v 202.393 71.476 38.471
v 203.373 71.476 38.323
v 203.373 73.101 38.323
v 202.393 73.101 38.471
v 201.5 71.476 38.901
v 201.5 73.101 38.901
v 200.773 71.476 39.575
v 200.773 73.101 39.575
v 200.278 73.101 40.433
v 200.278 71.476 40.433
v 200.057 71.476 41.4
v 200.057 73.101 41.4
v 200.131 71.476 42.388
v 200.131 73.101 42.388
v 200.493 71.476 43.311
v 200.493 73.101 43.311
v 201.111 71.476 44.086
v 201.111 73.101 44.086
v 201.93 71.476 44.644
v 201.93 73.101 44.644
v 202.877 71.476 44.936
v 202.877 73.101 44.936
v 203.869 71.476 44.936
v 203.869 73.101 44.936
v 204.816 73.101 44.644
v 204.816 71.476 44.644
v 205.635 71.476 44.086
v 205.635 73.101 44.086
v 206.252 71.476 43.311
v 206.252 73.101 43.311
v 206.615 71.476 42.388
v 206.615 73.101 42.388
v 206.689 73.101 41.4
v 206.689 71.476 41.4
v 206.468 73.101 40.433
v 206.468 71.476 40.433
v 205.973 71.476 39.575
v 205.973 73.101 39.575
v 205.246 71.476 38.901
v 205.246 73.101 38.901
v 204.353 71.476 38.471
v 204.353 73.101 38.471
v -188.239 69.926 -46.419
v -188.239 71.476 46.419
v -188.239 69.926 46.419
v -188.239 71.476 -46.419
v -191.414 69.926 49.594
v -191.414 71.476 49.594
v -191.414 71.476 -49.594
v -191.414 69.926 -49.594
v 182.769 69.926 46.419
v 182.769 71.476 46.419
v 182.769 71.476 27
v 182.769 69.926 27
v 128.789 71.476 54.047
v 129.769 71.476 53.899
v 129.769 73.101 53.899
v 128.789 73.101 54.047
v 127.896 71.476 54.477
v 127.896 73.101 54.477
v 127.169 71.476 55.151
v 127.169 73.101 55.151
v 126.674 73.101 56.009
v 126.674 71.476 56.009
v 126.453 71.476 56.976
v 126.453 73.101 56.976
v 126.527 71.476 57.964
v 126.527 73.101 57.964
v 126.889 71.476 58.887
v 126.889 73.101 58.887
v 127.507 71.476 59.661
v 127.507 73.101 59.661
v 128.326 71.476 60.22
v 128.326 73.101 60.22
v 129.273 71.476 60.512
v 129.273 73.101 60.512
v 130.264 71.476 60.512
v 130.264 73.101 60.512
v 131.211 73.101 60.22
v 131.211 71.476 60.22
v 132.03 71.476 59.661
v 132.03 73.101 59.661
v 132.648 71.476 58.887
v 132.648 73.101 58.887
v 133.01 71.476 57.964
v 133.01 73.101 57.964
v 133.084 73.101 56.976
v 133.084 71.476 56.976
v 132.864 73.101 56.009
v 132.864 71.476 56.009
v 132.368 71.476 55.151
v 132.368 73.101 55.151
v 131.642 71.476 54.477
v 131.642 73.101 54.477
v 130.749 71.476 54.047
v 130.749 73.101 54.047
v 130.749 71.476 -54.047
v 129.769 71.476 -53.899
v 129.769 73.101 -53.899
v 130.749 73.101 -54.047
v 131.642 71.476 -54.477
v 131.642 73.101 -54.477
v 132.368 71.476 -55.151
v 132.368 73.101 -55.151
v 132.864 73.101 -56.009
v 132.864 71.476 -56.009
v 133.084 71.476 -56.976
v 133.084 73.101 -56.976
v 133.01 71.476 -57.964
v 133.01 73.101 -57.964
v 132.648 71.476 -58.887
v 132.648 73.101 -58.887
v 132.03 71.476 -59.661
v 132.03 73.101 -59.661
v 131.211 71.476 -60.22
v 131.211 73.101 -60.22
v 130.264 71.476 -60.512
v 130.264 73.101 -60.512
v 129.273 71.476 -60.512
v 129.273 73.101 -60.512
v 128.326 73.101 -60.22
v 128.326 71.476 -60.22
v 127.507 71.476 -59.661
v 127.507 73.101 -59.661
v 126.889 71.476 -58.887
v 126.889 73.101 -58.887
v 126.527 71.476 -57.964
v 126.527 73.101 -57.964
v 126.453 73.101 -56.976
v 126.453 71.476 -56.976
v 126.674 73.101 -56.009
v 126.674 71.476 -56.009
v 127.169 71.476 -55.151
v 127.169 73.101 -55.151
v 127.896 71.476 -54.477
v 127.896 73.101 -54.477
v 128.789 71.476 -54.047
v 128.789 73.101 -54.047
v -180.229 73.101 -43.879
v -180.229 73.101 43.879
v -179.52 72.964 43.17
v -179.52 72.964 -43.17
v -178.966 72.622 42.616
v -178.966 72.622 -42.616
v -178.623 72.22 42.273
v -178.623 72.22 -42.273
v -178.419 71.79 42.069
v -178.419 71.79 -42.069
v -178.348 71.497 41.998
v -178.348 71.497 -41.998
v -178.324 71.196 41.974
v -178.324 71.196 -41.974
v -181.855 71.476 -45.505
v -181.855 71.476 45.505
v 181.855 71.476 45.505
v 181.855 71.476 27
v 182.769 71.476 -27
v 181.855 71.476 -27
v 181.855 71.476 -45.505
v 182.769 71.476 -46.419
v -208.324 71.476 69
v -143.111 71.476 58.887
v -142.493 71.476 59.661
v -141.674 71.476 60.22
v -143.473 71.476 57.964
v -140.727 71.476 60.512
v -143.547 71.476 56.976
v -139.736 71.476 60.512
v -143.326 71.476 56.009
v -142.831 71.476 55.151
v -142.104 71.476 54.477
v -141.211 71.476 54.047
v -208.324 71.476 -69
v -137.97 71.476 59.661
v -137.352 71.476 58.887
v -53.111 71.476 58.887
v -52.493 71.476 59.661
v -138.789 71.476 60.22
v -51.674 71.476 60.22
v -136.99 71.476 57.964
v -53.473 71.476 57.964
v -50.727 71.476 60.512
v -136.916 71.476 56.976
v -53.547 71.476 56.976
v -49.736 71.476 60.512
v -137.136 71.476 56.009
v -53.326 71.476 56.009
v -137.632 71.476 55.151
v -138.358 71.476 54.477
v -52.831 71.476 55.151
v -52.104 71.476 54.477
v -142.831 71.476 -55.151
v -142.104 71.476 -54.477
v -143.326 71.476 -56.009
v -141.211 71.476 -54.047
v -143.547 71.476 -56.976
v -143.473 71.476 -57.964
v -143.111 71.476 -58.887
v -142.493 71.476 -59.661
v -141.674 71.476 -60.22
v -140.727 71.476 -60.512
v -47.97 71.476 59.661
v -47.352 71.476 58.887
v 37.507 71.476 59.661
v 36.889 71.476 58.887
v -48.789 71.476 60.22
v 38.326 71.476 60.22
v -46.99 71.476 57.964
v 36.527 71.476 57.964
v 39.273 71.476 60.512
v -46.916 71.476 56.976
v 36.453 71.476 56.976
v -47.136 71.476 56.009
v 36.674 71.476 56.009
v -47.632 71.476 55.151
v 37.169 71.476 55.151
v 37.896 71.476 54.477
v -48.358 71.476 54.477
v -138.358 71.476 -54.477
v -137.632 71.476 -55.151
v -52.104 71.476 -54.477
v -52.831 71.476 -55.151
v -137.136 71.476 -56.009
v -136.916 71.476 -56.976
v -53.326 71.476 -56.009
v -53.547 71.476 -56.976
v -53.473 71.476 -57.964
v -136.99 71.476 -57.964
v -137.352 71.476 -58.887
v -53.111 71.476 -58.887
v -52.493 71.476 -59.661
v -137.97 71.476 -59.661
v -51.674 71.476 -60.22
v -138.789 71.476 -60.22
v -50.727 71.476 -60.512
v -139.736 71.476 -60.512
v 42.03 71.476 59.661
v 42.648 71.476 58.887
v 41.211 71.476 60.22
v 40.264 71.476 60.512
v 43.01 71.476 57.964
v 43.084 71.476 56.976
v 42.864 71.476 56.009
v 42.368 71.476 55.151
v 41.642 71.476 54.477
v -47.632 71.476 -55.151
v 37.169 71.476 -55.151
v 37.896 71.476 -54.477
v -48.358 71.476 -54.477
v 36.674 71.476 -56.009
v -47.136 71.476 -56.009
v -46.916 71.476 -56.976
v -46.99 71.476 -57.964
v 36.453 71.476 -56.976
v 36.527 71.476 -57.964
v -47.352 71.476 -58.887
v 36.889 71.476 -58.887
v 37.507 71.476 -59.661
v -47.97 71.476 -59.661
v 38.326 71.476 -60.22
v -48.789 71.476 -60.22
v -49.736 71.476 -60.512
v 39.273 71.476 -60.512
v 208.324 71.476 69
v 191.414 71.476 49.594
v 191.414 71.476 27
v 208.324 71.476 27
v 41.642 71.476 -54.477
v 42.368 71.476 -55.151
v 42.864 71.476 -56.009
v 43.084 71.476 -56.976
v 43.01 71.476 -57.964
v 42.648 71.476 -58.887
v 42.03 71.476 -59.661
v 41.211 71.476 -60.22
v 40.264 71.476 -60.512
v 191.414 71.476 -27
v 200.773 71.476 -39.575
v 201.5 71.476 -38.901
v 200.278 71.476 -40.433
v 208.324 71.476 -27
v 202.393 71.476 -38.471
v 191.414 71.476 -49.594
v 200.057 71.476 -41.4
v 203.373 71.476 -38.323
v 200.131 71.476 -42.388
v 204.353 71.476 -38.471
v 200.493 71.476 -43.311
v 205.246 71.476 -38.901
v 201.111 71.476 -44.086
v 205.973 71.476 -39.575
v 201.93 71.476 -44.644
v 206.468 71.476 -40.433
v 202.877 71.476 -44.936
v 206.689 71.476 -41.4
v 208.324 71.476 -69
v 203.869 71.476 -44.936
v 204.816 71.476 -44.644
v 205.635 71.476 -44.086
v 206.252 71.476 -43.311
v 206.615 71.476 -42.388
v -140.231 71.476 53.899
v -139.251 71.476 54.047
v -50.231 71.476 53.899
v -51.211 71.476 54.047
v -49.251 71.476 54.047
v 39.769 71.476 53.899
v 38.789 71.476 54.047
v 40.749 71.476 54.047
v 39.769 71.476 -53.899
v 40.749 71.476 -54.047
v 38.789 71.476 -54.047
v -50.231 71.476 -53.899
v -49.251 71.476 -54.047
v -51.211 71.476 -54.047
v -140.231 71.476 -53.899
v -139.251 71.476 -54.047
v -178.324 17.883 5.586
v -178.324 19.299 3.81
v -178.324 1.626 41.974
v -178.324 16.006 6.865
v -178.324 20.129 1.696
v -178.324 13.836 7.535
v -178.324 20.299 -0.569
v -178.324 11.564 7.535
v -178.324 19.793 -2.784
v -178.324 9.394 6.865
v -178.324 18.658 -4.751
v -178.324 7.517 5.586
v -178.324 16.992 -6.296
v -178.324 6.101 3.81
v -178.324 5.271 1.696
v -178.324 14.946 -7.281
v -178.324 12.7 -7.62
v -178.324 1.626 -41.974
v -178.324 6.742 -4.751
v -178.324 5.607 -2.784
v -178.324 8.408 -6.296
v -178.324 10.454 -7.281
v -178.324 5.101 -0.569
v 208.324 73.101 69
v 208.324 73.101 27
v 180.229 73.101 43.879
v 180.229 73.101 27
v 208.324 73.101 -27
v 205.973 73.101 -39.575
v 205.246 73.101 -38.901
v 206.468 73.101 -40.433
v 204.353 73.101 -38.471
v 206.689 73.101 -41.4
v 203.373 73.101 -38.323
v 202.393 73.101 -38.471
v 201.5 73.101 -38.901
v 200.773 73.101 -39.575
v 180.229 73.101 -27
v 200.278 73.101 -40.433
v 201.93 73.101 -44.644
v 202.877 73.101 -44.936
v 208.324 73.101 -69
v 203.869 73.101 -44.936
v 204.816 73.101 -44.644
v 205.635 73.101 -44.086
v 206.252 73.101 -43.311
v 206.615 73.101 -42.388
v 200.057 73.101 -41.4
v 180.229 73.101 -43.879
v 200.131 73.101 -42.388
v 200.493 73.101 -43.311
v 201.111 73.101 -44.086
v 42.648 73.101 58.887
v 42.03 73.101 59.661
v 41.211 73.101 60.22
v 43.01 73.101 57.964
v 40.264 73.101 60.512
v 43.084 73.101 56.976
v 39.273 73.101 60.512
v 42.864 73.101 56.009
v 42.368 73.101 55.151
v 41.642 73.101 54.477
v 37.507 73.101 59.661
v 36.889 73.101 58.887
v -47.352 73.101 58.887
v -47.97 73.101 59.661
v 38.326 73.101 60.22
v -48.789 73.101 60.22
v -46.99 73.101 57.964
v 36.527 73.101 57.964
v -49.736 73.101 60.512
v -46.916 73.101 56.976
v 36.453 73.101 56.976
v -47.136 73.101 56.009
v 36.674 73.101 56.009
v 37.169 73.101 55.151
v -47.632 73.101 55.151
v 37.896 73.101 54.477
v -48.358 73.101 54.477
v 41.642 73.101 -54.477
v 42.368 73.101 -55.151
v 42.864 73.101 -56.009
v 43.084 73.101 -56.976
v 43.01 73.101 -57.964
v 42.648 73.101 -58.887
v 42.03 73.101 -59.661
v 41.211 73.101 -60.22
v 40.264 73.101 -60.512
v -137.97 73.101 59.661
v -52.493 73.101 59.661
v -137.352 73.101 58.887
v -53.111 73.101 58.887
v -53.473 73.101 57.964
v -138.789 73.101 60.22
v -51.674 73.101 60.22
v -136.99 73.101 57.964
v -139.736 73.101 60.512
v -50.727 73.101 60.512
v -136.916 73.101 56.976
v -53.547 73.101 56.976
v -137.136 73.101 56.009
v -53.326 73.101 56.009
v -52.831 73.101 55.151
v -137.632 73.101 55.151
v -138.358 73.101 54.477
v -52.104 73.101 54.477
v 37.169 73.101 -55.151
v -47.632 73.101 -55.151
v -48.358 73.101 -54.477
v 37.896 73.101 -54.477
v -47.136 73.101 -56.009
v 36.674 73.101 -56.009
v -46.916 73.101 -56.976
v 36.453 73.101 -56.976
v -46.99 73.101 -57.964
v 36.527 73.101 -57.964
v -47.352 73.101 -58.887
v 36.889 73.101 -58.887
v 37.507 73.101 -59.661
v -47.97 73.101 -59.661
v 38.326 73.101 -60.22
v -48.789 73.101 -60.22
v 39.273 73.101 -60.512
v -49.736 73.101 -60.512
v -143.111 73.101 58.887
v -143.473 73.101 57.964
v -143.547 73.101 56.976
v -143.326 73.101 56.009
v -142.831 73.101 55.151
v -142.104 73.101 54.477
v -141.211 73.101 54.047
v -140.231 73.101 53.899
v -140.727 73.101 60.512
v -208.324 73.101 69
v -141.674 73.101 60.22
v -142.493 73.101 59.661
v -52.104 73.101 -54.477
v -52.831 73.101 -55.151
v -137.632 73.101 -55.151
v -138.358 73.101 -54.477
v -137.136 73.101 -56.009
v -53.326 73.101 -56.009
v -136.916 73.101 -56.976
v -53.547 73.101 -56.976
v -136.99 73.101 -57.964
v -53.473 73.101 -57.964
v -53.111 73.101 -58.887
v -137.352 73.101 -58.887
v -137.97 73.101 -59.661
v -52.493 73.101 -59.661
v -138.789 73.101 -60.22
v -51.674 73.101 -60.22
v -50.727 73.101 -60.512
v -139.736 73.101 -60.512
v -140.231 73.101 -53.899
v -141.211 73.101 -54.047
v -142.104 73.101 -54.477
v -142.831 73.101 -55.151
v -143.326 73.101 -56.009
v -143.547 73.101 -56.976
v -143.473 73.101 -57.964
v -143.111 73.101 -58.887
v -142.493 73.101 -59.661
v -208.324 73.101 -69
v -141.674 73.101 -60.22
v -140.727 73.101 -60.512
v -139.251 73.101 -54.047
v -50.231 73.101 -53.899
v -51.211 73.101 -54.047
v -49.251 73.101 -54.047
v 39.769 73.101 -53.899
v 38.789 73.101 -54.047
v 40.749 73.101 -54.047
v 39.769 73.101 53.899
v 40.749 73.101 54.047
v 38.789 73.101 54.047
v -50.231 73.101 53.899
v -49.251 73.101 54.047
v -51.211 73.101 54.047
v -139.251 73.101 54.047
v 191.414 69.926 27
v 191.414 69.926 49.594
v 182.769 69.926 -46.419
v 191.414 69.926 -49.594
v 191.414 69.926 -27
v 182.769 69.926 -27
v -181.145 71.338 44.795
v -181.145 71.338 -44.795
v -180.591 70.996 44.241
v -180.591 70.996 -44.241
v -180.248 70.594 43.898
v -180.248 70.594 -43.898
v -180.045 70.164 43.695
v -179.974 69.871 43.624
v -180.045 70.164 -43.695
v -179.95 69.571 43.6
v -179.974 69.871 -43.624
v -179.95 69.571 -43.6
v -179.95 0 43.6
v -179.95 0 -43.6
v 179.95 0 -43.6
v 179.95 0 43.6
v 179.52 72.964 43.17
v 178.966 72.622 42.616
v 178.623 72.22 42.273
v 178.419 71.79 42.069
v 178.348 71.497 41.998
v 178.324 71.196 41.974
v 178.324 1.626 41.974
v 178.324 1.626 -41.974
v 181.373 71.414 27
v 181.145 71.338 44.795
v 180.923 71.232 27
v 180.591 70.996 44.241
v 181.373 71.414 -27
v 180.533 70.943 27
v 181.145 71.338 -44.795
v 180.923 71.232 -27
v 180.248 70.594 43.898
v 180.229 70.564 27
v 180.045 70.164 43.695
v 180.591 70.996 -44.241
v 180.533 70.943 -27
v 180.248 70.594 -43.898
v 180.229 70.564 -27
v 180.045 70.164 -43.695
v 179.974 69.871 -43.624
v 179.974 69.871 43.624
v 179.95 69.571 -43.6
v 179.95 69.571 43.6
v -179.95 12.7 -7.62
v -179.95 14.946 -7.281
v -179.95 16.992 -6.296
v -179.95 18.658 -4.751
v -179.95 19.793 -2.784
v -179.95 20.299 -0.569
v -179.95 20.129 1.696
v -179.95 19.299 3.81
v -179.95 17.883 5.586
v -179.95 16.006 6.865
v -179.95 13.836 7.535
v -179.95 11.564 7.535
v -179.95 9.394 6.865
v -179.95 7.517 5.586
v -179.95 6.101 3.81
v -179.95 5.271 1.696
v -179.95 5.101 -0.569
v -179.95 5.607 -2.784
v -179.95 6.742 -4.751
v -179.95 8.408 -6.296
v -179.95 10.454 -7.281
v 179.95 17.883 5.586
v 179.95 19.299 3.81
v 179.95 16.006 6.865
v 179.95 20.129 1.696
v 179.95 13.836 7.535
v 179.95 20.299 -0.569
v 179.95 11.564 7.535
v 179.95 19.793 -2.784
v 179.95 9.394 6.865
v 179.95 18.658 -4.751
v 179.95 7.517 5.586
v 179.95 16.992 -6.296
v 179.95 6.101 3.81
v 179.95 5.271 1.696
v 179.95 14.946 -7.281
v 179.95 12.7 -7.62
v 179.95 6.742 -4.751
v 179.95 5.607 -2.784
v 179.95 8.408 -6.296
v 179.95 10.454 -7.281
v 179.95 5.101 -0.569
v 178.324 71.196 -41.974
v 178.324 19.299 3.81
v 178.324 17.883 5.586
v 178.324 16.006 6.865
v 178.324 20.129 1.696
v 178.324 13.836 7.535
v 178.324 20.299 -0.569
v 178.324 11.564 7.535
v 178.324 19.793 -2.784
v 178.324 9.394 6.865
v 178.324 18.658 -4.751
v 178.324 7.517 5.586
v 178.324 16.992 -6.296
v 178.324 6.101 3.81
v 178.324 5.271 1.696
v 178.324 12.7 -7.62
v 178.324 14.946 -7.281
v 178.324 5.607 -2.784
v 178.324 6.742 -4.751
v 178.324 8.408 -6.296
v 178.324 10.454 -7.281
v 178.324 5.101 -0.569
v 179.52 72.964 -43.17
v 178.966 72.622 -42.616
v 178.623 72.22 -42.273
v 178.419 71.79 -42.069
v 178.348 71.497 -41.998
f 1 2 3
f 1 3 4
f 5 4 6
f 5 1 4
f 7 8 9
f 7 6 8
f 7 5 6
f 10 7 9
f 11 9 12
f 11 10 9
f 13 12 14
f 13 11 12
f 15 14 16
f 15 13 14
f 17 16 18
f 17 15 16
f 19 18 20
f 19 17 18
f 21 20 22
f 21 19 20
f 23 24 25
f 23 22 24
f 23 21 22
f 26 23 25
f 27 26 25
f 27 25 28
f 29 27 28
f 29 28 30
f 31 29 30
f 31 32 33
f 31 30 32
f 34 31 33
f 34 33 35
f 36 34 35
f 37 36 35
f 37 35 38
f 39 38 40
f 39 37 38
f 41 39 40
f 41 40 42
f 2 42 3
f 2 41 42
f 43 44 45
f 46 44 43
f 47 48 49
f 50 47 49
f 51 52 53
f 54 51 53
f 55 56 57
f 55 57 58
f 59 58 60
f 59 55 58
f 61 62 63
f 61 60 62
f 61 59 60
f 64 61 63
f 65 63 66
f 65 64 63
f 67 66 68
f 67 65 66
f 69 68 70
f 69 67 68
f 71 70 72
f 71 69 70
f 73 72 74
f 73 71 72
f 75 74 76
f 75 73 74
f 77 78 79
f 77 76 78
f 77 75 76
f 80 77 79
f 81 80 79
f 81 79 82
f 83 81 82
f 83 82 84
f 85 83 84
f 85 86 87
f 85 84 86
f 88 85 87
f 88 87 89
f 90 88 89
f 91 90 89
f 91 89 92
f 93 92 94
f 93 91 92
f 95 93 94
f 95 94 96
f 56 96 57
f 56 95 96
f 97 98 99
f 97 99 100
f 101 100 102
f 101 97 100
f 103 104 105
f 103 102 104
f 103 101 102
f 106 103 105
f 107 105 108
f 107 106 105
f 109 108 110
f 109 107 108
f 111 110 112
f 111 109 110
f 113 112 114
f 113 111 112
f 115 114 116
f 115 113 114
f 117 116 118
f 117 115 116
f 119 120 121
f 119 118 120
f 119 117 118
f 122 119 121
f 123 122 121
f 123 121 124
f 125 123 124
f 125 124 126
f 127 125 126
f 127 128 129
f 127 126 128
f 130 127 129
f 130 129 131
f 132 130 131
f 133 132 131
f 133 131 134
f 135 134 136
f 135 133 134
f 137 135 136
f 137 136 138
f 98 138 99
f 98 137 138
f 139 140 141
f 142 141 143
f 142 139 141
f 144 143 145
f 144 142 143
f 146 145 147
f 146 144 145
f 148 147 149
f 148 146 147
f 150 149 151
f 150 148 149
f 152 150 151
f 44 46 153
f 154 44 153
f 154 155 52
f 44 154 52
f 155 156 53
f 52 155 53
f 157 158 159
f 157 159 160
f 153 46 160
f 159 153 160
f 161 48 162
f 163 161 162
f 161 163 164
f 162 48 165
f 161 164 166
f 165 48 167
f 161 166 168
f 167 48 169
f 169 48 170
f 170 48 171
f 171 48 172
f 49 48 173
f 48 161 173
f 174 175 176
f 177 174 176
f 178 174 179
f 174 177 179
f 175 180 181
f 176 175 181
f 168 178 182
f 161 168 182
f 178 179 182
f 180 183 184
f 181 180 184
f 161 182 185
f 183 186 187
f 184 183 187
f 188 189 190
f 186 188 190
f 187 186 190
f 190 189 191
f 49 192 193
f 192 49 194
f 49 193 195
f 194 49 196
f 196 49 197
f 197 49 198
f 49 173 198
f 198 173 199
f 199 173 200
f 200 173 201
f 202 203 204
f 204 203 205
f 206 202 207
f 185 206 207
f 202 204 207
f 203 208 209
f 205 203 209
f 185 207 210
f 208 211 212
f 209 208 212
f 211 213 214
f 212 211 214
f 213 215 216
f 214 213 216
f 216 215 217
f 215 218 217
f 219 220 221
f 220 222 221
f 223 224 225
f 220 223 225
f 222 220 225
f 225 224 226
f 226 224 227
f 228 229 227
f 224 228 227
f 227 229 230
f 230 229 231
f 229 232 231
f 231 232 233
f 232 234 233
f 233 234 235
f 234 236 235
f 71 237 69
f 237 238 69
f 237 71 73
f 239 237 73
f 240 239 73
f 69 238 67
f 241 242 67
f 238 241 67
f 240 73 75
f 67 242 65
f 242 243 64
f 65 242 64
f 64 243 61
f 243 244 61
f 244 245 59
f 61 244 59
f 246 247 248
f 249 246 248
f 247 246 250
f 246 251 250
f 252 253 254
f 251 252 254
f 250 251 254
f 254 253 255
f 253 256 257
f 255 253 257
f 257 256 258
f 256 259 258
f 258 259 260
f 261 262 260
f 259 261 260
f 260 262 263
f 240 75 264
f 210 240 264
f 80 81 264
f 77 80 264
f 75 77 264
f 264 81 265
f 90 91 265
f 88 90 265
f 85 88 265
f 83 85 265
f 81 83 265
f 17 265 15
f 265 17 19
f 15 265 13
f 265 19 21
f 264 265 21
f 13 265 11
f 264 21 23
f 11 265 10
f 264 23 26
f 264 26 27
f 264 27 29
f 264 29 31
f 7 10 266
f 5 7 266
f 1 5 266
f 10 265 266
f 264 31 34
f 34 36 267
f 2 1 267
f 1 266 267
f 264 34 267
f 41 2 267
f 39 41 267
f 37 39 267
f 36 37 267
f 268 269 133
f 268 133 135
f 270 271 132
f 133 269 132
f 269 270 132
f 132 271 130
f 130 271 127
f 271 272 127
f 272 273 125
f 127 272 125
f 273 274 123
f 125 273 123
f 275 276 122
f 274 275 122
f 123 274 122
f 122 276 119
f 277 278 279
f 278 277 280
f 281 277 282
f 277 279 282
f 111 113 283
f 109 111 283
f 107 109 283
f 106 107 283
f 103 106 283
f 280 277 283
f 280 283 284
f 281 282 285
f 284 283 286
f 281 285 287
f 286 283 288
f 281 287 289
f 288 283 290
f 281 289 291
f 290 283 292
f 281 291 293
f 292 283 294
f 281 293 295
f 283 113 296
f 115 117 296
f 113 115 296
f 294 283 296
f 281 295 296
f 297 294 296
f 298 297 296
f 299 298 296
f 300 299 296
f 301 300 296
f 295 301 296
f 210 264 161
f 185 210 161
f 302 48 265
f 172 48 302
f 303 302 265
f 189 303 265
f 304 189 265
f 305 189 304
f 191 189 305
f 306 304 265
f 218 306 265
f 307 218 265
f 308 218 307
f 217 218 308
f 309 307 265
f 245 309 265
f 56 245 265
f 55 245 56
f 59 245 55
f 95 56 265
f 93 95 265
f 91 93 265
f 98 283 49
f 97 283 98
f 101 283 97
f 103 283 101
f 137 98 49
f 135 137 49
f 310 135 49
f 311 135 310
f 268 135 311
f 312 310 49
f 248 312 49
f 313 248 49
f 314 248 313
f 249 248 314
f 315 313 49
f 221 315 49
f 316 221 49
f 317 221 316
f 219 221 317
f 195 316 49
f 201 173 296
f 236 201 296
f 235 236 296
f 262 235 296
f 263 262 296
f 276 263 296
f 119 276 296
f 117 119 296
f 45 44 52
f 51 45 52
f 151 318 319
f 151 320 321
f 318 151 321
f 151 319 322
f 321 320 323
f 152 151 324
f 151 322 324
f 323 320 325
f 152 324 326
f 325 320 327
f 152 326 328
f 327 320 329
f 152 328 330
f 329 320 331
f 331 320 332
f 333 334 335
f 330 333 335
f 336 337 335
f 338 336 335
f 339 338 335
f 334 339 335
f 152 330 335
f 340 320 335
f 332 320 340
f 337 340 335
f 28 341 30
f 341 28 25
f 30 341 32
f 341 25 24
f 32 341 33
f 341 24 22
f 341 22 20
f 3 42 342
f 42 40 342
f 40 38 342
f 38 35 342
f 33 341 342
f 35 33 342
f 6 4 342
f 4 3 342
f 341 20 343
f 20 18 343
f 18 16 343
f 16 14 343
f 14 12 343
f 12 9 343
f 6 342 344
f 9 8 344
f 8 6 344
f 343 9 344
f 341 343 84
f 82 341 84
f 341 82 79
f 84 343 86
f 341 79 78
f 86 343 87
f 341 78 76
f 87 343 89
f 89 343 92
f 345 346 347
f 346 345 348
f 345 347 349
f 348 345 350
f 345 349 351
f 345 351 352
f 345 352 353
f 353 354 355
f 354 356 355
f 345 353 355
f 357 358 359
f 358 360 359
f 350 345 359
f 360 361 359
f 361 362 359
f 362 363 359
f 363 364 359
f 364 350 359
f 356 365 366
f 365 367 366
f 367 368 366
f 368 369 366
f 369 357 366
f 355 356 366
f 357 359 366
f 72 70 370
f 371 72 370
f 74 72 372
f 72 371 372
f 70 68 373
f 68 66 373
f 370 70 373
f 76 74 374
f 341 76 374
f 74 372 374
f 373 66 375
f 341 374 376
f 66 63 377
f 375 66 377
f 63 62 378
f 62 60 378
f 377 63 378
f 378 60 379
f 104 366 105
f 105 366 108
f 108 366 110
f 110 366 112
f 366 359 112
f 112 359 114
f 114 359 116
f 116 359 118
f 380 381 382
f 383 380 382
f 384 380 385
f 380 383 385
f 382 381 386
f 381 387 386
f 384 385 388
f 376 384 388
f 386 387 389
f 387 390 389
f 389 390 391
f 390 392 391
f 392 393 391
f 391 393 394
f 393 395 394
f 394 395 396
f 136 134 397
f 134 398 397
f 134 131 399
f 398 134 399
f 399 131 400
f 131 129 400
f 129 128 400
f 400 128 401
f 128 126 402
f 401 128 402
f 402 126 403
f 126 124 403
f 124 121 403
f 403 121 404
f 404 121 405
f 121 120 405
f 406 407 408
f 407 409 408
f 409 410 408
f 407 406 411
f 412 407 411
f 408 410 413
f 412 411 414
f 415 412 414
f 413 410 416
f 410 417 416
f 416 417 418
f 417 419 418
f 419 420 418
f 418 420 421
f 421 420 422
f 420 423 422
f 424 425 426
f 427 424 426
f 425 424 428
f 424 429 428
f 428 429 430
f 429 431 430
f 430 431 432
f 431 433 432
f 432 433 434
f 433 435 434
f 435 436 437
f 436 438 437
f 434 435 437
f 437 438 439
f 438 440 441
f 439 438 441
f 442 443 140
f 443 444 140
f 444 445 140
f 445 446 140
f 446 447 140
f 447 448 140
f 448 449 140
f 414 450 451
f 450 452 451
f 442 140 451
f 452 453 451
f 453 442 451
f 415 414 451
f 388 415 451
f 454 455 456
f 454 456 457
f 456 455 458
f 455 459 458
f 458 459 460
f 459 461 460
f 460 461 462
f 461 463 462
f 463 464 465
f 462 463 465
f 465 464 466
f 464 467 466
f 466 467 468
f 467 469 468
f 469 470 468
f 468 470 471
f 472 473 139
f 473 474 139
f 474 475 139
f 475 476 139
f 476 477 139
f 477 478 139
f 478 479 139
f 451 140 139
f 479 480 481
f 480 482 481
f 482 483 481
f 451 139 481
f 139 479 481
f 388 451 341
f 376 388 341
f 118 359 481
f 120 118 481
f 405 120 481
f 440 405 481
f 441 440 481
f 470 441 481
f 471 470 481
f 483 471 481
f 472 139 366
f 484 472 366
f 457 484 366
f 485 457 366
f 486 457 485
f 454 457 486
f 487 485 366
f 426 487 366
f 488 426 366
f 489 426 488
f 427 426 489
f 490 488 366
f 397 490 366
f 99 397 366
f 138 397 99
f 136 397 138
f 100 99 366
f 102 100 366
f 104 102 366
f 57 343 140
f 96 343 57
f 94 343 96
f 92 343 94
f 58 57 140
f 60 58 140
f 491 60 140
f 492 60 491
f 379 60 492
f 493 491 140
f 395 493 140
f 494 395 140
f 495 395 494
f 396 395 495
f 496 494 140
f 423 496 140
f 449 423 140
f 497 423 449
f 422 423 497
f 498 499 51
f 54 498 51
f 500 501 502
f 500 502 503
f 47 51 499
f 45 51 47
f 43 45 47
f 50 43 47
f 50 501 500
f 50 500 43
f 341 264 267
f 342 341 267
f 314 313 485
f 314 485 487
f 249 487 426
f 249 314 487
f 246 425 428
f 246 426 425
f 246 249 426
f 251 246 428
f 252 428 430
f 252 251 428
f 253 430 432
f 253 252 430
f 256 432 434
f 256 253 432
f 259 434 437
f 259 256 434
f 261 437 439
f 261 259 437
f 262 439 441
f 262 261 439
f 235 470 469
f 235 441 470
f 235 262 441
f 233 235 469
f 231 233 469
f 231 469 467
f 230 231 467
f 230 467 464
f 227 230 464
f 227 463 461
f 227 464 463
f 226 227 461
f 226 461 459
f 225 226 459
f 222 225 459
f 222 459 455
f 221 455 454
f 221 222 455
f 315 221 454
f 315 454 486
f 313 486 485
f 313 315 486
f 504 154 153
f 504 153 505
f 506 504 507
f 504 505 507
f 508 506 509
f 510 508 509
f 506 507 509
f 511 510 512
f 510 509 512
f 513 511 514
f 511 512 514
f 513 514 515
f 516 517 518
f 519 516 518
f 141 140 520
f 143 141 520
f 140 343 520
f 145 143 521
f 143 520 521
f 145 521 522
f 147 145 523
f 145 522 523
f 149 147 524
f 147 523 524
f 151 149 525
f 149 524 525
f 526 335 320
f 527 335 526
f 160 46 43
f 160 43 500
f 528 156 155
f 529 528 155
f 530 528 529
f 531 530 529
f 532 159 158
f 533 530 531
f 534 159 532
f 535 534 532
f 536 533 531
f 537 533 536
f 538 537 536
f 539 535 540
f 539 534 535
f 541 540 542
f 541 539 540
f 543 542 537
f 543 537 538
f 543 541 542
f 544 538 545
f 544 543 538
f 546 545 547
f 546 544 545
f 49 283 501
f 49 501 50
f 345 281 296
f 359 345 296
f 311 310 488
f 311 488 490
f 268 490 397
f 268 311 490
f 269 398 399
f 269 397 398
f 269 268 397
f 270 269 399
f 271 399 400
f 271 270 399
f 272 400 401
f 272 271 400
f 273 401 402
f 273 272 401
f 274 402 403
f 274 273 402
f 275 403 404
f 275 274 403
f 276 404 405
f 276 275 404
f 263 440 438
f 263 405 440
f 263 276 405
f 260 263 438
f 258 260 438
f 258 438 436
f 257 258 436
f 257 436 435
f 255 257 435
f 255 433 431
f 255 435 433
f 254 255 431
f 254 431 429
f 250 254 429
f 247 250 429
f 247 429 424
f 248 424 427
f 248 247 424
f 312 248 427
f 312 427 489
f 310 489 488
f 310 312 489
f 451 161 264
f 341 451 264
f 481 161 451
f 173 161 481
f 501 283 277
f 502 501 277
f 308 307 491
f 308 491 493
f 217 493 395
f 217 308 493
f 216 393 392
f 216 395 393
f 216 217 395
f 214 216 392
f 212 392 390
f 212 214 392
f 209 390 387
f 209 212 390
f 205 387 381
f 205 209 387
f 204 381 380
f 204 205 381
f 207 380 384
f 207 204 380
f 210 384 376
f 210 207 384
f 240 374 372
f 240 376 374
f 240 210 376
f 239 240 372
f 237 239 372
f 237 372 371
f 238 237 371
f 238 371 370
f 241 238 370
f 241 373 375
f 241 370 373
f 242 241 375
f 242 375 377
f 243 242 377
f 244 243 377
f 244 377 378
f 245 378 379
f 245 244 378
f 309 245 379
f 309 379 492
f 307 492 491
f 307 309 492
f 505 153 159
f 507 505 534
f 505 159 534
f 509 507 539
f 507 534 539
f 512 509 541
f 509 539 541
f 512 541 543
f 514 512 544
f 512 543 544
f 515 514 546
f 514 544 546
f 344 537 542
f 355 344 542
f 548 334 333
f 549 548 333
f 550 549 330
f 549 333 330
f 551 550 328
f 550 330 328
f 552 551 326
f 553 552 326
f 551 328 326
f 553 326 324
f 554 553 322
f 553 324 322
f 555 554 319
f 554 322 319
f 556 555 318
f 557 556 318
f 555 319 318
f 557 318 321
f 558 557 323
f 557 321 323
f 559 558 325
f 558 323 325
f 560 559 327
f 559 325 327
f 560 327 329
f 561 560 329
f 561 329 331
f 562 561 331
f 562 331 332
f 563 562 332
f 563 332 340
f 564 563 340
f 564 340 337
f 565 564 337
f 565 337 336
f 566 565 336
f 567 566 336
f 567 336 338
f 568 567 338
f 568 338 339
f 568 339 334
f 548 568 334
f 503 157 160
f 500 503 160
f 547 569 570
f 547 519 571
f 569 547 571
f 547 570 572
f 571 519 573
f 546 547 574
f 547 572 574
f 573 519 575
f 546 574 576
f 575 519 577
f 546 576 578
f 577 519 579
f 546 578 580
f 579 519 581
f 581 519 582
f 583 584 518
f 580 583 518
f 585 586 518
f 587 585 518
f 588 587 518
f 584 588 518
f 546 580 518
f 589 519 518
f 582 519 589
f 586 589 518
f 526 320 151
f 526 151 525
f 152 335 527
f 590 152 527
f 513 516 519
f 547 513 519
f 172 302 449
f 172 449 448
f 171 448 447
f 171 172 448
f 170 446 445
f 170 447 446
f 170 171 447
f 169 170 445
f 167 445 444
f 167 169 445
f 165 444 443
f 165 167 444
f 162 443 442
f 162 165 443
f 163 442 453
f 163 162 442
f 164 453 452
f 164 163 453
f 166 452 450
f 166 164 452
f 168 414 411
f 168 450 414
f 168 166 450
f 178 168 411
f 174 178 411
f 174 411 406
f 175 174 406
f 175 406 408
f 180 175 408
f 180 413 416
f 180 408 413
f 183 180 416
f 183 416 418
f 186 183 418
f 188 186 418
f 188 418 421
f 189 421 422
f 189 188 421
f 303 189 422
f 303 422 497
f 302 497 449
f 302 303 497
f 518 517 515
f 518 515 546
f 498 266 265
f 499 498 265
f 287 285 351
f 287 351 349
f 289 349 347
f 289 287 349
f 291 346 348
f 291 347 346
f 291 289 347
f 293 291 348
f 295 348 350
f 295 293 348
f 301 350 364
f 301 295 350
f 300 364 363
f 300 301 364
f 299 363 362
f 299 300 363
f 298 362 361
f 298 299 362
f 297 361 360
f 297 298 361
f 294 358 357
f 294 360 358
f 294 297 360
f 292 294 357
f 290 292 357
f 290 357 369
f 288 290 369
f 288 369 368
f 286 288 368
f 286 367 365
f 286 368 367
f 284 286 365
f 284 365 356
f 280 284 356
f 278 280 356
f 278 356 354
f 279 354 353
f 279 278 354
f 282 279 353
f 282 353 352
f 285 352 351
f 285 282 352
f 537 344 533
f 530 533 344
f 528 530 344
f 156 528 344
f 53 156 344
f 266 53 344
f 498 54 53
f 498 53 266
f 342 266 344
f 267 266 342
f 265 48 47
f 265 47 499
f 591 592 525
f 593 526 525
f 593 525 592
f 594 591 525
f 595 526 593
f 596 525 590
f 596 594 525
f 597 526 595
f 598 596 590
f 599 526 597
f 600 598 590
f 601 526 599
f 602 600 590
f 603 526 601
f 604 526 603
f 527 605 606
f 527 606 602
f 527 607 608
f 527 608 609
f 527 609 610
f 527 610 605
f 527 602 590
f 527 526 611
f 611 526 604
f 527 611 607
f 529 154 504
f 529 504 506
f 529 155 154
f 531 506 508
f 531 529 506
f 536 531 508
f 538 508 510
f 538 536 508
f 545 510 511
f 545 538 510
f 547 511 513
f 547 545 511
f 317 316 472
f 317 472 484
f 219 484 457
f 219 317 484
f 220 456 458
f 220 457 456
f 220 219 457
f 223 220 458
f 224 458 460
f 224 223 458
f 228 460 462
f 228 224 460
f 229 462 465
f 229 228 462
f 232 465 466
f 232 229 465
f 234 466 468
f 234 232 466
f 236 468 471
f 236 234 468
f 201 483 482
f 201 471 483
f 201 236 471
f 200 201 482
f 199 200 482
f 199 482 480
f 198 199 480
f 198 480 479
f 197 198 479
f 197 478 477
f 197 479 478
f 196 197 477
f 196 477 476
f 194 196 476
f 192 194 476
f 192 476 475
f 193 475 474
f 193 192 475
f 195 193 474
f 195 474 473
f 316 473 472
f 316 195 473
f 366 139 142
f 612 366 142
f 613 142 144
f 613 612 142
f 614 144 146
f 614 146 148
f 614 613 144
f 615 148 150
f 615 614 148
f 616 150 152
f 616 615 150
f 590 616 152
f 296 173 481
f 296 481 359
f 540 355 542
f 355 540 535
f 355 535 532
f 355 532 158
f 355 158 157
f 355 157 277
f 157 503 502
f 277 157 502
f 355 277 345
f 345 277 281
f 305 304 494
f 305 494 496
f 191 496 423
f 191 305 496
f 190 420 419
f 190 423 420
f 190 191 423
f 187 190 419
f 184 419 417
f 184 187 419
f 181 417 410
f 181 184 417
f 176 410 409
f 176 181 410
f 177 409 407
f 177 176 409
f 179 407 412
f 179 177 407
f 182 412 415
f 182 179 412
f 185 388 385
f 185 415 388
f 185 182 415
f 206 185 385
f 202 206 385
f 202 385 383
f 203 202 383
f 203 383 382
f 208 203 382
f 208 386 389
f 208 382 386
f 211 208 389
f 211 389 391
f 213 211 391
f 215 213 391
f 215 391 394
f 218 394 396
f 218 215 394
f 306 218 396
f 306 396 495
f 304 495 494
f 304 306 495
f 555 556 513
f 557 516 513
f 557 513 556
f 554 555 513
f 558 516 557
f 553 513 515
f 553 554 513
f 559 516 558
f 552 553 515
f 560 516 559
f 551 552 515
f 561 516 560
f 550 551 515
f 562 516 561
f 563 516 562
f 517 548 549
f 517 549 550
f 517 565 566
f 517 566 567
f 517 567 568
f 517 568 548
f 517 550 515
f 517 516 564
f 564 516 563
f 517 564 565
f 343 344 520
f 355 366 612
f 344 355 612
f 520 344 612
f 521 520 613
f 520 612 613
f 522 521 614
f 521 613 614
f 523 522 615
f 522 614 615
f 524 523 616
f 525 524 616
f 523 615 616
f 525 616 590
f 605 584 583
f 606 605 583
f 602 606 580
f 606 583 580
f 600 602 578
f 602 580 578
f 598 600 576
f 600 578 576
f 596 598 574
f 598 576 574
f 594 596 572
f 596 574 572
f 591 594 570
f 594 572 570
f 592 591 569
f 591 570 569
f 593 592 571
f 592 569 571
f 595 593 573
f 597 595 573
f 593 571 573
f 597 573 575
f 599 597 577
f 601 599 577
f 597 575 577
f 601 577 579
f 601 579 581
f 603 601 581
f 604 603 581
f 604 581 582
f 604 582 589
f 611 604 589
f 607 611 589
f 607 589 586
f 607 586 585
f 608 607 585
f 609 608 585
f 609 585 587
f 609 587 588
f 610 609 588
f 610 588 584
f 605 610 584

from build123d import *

# Parameters (mm, degrees)
SKETCH1_W               = 359.9
SKETCH1_H               = 87.2
BOSS_EXTRUDE1_DEPTH     = 1.6256
SKETCH2_W               = 359.9
SKETCH2_H               = 87.2
SKETCH2_W_2             = 356.6488
SKETCH2_H_2             = 83.9488
BOSS_EXTRUDE2_DEPTH     = 69.85
SKETCH3_W               = 416.6488
SKETCH3_H               = 138
SKETCH3_W_2             = 356.6488
SKETCH3_H_2             = 83.9488
BOSS_EXTRUDE3_DEPTH     = 1.6256
FILLET1_R               = 1.905
SKETCH6_W               = 371.0088
SKETCH6_H               = 92.8388
BOSS_EXTRUDE4_DEPTH     = 3.175
SKETCH8_R               = 7.62
CUT_EXTRUDE2_DEPTH      = 402.075797246
CUT_EXTRUDE4_DEPTH      = 232.308973187
CUT_EXTRUDE4_DEPTH_BACK = 232.308973187
SKETCH17_W              = 28.095
SKETCH17_H              = 54
CUT_EXTRUDE5_DEPTH      = 232.308973187
CUT_EXTRUDE5_DEPTH_BACK = 232.308973187
SKETCH18_R              = 3.325


with BuildPart() as part:
    # Sketch1 → Boss-Extrude1 (new body)
    with BuildSketch(Plane(origin=(0, 0, 0), x_dir=(1, 0, 0), z_dir=(0, 1, 0))):
        Rectangle(SKETCH1_W, SKETCH1_H)
    extrude(amount=BOSS_EXTRUDE1_DEPTH)

    # Sketch2 → Boss-Extrude2 (add)
    with BuildSketch(Plane(origin=(0, 1.6256, 0), x_dir=(1, 0, 0), z_dir=(0, 1, 0))):
        Rectangle(SKETCH2_W, SKETCH2_H)
        Rectangle(SKETCH2_W_2, SKETCH2_H_2, mode=Mode.SUBTRACT)
    extrude(amount=BOSS_EXTRUDE2_DEPTH)

    # Sketch3 → Boss-Extrude3 (add)
    with BuildSketch(Plane(origin=(0, 71.4756, 0), x_dir=(1, 0, 0), z_dir=(0, 1, 0))):
        Rectangle(SKETCH3_W, SKETCH3_H)
        Rectangle(SKETCH3_W_2, SKETCH3_H_2, mode=Mode.SUBTRACT)
    extrude(amount=BOSS_EXTRUDE3_DEPTH)

    # Fillet1
    fillet1_edges = [part.edges().sort_by_distance(p)[0] for p in [
        (0, 71.4756, -43.6),
        (-179.95, 71.4756, 0),
        (0, 71.4756, 43.6),
        (179.95, 71.4756, 0),
        (-178.3244, 73.1012, 0),
        (0, 73.1012, 41.9744),
        (178.3244, 73.1012, 0),
        (0, 73.1012, -41.9744),
    ]]
    fillet(fillet1_edges, radius=FILLET1_R)

    # Sketch6 → Boss-Extrude4 (add)
    with BuildSketch(Plane(origin=(0, 73.1012, 0), x_dir=(1, 0, 0), z_dir=(0, 1, 0))):
        Polygon((188.2394, -49.5944), (-188.2394, -49.5944), (-191.4144, -49.5944), (-191.4144, 49.5944), (-188.2394, 49.5944), (188.2394, 49.5944), (191.4144, 49.5944), (191.4144, -49.5944), align=None)
        with Locations((-2.735, 0)):
            Rectangle(SKETCH6_W, SKETCH6_H, mode=Mode.SUBTRACT)
    extrude(amount=-BOSS_EXTRUDE4_DEPTH)

    # Sketch8 → Cut-Extrude2 (cut, through all)
    with BuildSketch(Plane(origin=(179.95, 0, 0), x_dir=(0, 0, -1), z_dir=(1, 0, 0))):
        with Locations((0, 12.7)):
            Circle(SKETCH8_R)
    extrude(amount=-CUT_EXTRUDE2_DEPTH, mode=Mode.SUBTRACT)

    # Sketch17 → Cut-Extrude4 (cut, two sides: drawn at the far end of the back side and taken through both)
    with BuildSketch(Plane(origin=(0, 73.1012, 0), x_dir=(1, 0, 0), z_dir=(0, 1, 0)).offset(-CUT_EXTRUDE4_DEPTH_BACK)):
        with Locations((194.2769, 0)):
            Rectangle(SKETCH17_W, SKETCH17_H)
    extrude(amount=CUT_EXTRUDE4_DEPTH + CUT_EXTRUDE4_DEPTH_BACK, mode=Mode.SUBTRACT)

    # Sketch18 → Cut-Extrude5 (cut, two sides: drawn at the far end of the back side and taken through both)
    with BuildSketch(Plane(origin=(0, 73.1012, 0), x_dir=(1, 0, 0), z_dir=(0, 1, 0)).offset(-CUT_EXTRUDE5_DEPTH_BACK)):
        with Locations(Location((203.37295269, 41.64816795, 0), (0, 0, 270))):
            Circle(SKETCH18_R)
        with Locations(Location((203.37295269, -41.64816795, 0), (0, 0, 90))):
            Circle(SKETCH18_R)
        with Locations(Location((129.76878637, 57.22406113, 0), (0, 0, 270))):
            Circle(SKETCH18_R)
        with Locations(Location((-50.23121363, 57.22406113, 0), (0, 0, 270))):
            Circle(SKETCH18_R)
        with Locations(Location((39.76878637, 57.22406113, 0), (0, 0, 270))):
            Circle(SKETCH18_R)
        with Locations(Location((-140.23121363, 57.22406113, 0), (0, 0, 270))):
            Circle(SKETCH18_R)
        with Locations(Location((129.76878637, -57.22406113, 0), (0, 0, 90))):
            Circle(SKETCH18_R)
        with Locations(Location((39.76878637, -57.22406113, 0), (0, 0, 90))):
            Circle(SKETCH18_R)
        with Locations(Location((-50.23121363, -57.22406113, 0), (0, 0, 90))):
            Circle(SKETCH18_R)
        with Locations(Location((-140.23121363, -57.22406113, 0), (0, 0, 90))):
            Circle(SKETCH18_R)
    extrude(amount=CUT_EXTRUDE5_DEPTH + CUT_EXTRUDE5_DEPTH_BACK, mode=Mode.SUBTRACT)


solid = part.part
